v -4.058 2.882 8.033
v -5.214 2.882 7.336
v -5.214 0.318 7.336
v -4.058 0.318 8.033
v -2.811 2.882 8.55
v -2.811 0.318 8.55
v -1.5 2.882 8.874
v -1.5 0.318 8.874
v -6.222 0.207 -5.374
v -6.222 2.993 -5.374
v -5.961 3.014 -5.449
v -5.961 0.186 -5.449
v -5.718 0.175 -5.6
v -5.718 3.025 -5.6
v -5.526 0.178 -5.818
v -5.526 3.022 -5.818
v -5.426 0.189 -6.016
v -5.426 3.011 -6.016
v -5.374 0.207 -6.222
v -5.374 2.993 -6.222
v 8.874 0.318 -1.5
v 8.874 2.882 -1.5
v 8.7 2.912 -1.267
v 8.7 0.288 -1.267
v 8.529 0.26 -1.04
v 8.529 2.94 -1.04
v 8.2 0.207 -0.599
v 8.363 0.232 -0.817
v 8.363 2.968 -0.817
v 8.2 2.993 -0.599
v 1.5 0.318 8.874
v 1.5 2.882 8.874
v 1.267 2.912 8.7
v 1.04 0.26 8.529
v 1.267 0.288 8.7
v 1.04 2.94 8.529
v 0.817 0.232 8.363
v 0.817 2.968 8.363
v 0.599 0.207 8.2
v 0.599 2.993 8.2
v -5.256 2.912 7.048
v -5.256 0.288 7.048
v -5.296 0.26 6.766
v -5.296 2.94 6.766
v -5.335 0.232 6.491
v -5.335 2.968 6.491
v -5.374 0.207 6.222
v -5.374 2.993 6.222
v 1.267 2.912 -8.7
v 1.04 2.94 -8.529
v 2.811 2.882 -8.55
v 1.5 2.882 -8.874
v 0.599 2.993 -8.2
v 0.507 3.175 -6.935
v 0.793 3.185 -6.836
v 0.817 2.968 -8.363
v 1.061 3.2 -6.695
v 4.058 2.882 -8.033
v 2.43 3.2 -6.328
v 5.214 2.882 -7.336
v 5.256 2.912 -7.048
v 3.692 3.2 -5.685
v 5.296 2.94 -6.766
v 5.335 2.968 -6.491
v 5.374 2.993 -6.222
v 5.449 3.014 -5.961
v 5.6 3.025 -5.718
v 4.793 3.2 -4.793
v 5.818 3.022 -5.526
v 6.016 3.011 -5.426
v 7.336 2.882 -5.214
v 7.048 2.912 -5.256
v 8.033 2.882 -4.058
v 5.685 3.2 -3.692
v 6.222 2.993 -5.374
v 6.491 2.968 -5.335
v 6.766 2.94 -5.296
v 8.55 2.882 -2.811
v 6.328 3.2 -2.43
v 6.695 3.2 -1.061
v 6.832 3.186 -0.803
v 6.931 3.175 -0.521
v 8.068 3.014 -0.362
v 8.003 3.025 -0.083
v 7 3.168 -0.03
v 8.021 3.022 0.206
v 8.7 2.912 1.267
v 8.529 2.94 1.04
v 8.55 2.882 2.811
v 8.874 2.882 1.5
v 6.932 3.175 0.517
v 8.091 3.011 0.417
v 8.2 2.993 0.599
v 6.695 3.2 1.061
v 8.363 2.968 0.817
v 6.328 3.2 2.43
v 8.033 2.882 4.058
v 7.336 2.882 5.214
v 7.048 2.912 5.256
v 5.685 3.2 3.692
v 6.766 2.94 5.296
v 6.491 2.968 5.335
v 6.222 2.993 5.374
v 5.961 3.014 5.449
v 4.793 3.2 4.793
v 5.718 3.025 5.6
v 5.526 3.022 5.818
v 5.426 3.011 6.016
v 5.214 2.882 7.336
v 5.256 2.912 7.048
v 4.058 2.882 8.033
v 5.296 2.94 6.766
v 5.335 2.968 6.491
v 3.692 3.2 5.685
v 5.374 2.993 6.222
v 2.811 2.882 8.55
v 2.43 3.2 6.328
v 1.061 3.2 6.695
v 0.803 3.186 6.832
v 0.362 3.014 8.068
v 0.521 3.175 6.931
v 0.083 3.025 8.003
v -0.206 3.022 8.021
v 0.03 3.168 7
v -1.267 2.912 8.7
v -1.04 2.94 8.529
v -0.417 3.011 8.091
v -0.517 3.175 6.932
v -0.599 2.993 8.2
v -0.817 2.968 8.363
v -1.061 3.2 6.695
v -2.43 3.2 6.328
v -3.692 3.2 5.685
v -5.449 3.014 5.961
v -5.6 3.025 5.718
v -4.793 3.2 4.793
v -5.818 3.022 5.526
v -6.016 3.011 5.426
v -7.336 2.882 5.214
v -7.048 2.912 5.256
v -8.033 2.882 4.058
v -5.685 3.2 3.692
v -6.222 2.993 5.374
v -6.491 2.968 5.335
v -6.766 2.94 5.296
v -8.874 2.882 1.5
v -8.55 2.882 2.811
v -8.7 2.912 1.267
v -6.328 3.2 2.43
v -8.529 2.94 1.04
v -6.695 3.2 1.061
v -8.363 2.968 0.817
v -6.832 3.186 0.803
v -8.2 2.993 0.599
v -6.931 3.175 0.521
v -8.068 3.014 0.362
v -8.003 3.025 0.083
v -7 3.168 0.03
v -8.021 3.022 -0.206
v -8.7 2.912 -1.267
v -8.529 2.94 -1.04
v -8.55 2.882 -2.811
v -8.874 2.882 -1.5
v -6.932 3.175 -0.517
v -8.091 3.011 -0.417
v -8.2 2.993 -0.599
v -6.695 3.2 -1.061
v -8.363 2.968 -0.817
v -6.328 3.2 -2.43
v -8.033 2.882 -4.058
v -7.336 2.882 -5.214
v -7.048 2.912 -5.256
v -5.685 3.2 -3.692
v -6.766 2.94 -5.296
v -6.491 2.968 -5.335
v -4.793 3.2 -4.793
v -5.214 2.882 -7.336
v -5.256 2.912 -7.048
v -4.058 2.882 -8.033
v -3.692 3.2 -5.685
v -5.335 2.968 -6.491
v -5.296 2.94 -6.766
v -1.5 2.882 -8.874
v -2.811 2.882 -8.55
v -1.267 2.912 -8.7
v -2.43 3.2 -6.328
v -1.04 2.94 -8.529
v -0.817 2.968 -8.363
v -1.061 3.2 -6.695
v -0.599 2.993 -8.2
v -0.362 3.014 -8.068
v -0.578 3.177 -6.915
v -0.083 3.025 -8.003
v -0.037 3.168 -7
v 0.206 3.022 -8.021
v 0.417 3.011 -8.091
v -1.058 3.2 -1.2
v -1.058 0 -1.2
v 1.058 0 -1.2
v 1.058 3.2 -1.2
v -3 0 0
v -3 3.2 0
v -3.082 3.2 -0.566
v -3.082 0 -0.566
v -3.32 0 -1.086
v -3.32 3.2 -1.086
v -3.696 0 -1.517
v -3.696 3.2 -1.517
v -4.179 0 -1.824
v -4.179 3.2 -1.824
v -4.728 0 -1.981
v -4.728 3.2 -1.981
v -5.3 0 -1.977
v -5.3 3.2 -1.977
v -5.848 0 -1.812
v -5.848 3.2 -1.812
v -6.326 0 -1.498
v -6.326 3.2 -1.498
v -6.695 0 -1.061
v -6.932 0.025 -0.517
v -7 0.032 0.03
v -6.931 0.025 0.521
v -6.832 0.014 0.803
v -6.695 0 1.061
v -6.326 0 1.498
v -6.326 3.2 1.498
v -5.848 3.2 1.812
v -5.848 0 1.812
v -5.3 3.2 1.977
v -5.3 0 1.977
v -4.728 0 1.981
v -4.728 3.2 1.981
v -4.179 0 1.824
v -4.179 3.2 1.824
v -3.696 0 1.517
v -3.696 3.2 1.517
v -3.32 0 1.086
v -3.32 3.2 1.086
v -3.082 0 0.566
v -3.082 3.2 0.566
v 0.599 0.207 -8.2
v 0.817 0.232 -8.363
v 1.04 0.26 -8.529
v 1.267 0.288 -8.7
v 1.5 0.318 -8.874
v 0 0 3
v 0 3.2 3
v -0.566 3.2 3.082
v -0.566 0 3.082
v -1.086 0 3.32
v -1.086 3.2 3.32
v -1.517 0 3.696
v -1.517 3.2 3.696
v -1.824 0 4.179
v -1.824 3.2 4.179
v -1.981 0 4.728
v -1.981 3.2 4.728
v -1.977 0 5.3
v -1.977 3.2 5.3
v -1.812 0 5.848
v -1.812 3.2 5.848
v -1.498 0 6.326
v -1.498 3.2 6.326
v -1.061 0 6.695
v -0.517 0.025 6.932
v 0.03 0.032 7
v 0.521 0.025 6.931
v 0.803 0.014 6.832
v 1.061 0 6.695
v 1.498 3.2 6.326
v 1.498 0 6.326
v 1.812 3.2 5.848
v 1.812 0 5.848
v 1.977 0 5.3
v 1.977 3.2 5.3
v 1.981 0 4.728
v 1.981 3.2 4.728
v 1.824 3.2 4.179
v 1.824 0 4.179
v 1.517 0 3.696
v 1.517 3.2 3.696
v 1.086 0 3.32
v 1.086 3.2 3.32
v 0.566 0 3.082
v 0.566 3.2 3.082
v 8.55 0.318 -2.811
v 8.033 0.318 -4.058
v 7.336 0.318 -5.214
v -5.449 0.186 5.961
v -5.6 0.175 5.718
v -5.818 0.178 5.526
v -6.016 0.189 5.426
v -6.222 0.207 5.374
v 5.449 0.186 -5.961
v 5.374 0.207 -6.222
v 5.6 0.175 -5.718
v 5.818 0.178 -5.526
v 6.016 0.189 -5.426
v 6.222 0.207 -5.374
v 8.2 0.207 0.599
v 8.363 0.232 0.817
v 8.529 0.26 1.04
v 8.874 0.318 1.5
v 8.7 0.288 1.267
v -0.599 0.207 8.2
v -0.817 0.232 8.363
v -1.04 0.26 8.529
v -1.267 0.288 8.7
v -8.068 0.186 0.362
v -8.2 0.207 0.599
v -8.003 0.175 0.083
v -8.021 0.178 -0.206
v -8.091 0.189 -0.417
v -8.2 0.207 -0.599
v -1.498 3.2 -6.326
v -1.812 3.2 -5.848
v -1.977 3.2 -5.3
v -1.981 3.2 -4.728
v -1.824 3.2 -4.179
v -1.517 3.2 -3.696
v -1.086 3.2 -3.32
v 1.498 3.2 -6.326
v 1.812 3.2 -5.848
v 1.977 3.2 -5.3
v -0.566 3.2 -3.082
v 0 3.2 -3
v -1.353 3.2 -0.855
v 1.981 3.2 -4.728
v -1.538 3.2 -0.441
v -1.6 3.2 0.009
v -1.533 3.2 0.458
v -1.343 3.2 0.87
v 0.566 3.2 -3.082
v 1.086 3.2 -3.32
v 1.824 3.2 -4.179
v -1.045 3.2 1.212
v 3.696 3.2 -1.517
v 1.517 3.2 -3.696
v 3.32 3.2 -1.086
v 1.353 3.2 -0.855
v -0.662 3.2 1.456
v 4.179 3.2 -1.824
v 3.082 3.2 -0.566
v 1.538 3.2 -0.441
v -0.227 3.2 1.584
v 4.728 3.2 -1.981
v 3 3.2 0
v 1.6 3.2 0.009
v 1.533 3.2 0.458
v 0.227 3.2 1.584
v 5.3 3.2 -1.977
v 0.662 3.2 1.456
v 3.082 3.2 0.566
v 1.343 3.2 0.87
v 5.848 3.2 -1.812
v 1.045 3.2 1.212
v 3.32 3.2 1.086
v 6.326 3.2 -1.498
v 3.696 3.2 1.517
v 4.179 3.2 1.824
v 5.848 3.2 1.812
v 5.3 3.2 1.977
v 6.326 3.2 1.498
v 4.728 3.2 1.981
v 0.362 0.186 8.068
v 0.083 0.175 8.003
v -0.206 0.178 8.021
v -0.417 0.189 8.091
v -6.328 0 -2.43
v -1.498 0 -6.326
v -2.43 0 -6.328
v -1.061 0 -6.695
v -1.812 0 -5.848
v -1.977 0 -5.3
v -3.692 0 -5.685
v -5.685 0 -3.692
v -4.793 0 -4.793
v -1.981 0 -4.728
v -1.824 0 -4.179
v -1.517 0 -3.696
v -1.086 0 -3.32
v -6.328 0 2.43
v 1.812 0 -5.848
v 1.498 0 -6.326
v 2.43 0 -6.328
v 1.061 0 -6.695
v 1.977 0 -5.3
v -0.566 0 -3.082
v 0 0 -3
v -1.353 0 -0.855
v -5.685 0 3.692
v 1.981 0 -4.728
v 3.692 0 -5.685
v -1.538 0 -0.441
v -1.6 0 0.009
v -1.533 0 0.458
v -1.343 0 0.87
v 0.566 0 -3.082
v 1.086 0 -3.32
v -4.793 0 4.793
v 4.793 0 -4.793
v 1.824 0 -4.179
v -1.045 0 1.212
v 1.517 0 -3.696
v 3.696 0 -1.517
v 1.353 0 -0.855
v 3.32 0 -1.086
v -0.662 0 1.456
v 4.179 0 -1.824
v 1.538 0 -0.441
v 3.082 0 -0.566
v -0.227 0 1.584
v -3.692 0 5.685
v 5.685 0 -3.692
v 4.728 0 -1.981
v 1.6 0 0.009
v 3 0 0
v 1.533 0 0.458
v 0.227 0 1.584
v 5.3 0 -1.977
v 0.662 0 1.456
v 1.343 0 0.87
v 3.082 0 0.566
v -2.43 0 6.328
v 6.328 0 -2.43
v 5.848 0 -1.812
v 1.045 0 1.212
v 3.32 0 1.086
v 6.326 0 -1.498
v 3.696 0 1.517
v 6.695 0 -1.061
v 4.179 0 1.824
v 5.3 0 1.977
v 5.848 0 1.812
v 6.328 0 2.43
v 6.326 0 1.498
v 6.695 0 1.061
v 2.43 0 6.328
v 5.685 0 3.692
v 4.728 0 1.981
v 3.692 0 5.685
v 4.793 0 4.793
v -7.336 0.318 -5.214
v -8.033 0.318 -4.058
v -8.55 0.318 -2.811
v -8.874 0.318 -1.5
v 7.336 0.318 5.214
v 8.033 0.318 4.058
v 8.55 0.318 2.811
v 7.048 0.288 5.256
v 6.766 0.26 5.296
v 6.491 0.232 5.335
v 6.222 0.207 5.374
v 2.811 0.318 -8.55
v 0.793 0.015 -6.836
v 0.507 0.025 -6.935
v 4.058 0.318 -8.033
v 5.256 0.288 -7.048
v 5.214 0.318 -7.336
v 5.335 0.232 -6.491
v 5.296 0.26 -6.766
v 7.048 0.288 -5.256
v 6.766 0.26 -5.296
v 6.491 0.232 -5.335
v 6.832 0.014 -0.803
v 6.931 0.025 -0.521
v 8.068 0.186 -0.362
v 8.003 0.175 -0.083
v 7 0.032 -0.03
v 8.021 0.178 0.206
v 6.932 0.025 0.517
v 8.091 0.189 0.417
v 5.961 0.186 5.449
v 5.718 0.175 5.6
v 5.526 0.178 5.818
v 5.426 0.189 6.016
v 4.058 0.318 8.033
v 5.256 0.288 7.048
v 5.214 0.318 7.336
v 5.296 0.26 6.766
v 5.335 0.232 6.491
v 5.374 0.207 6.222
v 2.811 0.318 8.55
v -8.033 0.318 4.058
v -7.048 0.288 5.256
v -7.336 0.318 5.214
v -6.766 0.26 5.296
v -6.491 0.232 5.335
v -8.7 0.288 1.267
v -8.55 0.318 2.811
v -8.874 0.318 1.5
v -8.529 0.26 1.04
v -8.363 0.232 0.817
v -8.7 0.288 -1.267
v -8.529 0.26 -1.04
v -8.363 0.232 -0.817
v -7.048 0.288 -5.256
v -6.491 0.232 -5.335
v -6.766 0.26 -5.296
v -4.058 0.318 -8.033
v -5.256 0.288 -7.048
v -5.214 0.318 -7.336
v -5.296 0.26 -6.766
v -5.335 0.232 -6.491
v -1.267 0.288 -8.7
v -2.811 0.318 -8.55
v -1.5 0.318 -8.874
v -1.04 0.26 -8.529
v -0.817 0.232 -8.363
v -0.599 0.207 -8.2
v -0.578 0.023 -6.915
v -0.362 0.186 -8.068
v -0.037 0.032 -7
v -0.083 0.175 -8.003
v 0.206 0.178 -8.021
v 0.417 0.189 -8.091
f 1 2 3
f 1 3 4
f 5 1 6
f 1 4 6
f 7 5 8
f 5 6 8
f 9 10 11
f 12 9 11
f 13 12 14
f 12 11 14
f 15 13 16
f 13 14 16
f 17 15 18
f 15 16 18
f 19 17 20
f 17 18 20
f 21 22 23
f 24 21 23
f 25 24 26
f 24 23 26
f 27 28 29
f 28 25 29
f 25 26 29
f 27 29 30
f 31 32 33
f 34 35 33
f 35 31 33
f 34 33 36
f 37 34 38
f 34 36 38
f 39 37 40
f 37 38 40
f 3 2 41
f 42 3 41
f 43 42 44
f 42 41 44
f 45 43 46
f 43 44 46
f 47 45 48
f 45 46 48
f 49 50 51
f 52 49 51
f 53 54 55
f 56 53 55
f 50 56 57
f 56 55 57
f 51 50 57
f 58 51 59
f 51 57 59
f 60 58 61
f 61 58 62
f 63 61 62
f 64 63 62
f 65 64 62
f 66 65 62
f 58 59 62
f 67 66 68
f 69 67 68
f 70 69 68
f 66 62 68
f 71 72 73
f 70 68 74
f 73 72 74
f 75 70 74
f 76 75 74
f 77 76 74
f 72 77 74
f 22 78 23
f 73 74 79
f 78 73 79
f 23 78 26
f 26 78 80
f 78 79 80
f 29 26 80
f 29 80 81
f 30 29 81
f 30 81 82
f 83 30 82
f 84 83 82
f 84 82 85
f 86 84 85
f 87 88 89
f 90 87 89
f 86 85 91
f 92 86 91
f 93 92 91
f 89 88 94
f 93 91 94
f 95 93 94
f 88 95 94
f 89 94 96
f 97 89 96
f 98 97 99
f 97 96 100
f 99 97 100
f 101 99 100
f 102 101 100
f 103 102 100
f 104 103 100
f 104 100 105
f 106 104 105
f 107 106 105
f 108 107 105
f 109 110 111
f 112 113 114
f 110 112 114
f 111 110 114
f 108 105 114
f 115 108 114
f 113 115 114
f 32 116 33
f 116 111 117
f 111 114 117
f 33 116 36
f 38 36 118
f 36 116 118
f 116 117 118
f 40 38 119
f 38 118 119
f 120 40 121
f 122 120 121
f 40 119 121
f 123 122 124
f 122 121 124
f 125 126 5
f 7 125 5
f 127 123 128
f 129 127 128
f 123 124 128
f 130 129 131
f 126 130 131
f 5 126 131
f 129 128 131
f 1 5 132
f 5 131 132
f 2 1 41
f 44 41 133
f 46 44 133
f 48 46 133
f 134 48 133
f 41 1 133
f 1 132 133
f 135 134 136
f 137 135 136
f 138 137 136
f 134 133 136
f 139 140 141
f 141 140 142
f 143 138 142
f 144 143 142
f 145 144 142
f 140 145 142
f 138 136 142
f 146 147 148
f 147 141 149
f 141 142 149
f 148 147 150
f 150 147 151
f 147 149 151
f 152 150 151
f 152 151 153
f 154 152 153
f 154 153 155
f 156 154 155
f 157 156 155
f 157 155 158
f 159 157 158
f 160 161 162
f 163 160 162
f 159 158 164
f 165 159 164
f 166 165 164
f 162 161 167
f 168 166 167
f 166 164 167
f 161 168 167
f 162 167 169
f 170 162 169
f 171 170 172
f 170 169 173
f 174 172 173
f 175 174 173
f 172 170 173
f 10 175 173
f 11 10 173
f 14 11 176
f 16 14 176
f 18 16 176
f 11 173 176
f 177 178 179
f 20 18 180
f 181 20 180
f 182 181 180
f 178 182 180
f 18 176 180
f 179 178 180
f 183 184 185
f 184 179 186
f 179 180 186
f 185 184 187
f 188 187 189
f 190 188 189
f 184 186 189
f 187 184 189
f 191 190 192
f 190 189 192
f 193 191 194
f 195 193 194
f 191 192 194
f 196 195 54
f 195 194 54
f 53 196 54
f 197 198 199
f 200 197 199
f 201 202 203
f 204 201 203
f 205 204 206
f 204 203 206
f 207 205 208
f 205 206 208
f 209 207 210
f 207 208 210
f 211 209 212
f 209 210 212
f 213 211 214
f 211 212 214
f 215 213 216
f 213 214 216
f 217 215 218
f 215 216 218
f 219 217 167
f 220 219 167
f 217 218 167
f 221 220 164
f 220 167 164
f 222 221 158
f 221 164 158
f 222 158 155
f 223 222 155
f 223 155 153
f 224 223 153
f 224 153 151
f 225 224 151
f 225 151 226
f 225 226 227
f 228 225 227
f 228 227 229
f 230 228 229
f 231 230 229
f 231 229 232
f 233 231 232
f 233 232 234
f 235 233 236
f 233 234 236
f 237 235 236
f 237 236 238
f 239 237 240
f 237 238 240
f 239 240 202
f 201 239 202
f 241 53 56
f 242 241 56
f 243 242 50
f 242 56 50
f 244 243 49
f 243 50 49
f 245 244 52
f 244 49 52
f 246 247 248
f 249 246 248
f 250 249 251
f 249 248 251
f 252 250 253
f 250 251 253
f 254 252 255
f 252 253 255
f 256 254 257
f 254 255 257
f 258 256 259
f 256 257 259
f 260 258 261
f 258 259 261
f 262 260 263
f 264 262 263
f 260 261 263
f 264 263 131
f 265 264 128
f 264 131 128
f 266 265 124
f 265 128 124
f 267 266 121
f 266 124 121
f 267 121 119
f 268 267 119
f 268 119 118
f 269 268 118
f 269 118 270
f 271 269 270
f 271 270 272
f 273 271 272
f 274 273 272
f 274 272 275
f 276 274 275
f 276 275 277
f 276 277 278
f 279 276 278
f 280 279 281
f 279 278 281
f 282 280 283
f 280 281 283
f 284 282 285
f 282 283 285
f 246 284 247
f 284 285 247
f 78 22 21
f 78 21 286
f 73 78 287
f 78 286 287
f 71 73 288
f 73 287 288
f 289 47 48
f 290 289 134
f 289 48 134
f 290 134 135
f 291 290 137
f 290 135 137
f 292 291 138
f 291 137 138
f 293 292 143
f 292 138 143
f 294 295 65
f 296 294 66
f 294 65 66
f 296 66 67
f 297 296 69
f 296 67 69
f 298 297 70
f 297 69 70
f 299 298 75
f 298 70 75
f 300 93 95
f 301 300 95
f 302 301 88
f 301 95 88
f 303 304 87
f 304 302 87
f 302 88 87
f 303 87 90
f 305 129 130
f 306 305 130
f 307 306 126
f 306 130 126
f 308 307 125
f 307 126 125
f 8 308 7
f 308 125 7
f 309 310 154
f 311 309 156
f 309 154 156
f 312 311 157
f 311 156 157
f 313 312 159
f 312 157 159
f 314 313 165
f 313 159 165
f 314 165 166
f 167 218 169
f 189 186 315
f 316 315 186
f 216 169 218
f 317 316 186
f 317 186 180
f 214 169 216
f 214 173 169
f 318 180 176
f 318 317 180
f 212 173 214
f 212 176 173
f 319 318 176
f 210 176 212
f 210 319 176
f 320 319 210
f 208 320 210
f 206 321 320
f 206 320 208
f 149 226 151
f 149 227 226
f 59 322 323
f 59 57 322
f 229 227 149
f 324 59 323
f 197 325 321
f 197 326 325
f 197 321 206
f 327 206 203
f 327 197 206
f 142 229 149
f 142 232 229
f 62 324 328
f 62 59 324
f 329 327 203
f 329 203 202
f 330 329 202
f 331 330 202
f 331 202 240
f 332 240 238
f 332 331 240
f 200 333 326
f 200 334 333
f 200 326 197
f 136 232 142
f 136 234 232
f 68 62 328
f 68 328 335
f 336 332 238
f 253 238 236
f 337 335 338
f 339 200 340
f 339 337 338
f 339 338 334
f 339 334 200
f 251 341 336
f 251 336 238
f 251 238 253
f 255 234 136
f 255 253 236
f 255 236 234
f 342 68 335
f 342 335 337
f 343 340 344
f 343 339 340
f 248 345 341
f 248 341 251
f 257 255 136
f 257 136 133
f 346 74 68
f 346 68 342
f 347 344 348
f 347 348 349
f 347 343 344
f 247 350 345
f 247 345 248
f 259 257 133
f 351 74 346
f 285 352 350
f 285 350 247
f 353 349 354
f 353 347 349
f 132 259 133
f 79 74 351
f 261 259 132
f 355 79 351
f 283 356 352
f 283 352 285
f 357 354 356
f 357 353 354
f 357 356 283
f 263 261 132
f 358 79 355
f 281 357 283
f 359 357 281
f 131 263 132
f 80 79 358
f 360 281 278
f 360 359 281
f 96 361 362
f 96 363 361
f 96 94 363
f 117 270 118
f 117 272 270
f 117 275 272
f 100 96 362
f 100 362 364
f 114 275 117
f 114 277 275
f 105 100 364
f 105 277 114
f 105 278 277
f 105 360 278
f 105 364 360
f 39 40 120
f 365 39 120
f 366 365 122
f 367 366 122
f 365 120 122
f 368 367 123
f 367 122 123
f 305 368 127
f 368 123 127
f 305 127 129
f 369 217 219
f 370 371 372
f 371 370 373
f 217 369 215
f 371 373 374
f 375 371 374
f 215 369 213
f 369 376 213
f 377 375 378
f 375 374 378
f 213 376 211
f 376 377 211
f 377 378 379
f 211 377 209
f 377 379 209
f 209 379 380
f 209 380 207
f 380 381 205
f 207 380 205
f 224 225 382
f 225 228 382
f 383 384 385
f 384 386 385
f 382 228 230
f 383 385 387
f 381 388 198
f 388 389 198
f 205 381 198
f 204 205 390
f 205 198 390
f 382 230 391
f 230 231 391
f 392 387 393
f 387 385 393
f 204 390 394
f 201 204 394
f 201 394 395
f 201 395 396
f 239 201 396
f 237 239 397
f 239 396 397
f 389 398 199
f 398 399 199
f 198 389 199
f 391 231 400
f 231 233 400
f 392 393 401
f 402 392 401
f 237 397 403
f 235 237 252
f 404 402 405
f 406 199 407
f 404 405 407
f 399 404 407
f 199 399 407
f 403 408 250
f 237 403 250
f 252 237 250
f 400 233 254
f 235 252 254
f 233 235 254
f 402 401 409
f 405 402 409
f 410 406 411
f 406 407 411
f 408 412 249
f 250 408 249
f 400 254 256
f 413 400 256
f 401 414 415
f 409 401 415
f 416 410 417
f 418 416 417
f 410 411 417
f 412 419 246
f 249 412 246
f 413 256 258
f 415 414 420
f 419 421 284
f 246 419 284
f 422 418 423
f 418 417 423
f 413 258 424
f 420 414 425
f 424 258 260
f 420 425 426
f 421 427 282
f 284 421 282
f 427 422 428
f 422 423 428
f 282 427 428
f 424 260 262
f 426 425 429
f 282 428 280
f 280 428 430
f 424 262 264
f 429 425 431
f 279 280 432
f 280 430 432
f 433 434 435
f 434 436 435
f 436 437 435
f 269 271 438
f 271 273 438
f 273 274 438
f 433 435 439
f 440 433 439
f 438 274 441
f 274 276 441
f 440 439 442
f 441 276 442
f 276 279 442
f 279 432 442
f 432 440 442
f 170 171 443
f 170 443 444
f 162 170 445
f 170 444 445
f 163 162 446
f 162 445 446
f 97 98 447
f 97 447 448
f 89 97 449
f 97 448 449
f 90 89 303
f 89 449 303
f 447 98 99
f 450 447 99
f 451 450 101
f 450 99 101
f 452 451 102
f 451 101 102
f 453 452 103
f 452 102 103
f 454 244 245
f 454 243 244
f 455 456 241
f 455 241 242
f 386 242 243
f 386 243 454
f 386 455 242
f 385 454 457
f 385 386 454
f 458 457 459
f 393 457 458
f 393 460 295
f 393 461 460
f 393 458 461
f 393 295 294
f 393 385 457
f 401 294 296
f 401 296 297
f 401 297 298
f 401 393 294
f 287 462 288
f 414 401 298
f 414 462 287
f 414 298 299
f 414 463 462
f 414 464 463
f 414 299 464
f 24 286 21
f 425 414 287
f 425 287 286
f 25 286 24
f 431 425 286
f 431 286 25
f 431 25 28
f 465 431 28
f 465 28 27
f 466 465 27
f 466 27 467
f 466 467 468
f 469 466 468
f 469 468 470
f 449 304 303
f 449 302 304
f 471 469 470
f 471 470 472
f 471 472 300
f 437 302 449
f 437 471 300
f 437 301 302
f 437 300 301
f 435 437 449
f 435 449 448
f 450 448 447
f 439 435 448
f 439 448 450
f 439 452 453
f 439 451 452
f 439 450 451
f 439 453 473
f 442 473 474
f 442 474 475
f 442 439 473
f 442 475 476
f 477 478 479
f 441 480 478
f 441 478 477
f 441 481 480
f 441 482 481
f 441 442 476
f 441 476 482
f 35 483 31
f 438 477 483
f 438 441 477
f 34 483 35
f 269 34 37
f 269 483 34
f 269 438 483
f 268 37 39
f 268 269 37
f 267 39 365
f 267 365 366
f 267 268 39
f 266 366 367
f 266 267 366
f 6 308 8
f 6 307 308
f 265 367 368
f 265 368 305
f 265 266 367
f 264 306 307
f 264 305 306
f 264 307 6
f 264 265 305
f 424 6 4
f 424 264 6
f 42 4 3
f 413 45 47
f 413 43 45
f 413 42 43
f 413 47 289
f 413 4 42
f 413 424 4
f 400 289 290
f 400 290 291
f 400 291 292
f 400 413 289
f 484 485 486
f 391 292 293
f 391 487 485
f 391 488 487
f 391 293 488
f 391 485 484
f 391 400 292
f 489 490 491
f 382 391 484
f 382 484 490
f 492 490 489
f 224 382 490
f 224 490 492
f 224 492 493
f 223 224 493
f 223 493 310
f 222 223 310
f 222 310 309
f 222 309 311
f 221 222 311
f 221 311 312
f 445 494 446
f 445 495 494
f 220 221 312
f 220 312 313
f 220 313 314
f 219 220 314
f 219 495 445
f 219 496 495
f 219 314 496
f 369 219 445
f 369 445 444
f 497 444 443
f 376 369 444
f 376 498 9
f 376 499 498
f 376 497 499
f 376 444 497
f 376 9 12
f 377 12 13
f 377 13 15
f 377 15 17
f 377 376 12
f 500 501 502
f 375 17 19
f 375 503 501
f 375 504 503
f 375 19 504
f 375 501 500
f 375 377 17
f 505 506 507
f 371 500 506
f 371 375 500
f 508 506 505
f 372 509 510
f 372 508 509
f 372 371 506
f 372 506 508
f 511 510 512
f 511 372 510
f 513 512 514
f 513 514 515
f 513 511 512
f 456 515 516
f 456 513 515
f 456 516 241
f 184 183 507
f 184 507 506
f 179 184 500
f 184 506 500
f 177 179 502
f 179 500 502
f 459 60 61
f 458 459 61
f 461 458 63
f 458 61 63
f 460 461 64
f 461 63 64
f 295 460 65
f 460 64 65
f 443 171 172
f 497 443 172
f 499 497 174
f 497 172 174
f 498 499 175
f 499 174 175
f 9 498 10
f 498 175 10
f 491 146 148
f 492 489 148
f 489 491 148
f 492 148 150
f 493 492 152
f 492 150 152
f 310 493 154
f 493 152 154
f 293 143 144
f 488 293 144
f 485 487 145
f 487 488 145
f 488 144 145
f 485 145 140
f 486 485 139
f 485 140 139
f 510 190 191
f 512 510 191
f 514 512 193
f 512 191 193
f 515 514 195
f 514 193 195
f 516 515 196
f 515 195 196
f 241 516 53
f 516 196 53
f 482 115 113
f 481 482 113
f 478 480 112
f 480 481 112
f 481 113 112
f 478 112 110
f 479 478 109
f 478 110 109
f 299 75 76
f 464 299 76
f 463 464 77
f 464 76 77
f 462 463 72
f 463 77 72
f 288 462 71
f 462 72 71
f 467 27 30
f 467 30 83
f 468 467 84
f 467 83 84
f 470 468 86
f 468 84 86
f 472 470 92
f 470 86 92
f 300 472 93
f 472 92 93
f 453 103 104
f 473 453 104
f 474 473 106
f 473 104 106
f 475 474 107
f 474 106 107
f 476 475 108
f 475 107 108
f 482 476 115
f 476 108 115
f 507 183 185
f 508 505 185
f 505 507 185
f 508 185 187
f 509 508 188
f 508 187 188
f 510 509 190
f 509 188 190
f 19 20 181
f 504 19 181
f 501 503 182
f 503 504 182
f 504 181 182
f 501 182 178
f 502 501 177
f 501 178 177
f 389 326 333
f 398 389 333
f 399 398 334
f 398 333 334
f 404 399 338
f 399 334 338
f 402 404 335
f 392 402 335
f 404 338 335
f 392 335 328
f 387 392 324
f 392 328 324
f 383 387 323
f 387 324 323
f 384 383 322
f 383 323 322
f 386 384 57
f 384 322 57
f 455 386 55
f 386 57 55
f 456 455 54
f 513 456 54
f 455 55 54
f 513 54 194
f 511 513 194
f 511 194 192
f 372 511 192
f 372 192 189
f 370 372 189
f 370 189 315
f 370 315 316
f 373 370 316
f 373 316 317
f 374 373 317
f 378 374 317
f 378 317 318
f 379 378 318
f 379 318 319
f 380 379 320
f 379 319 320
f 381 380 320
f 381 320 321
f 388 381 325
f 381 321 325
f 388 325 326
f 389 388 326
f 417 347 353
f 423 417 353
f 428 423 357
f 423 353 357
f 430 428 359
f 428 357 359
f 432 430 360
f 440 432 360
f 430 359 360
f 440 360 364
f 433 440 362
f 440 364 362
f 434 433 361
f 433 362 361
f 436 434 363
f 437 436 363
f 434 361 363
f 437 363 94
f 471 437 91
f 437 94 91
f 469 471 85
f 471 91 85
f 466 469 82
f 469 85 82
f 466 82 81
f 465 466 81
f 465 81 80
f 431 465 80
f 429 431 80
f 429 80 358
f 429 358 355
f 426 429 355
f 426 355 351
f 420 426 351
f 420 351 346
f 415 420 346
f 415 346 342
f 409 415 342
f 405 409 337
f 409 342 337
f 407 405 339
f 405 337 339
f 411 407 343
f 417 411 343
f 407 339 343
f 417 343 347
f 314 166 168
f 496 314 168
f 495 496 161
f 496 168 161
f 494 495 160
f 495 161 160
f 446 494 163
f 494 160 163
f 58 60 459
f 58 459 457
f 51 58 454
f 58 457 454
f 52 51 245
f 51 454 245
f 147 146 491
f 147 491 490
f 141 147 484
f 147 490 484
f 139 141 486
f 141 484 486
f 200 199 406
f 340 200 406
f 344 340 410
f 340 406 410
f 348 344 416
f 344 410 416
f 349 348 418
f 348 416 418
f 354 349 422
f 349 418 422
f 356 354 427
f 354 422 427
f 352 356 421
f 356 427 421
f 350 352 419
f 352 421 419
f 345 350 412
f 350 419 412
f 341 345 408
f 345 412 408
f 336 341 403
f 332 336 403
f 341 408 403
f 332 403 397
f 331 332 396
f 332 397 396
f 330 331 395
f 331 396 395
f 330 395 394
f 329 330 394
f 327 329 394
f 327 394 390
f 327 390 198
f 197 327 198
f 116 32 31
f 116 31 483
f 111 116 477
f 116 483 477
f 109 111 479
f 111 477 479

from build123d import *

# Parameters (mm, degrees)
SKETCH_1_R               = 9
EXTRUDE_1_DEPTH          = 3.2
CUT_EXTRUDE_2_REACH      = 15.124
PATTERN_CIRCULAR_1_COUNT = 8
CUT_EXTRUDE_1_REACH      = 14.951
SKETCH_3_R               = 2
PATTERN_CIRCULAR_2_COUNT = 4


with BuildPart() as part:
    # 草图1 → 凸台-拉伸1 (new body)
    with BuildSketch(Plane(origin=(0, 0, 0), x_dir=(1, 0, 0), z_dir=(0, 1, 0))):
        with Locations(Location((0, 0, 0), (0, 0, 270))):
            Circle(SKETCH_1_R)
        with BuildLine():
            Line((-1.058300524, 1.2), (1.058300524, 1.2))
            ThreePointArc((1.058300524, 1.2), (0, -1.6), (-1.058300524, 1.2))
        make_face(mode=Mode.SUBTRACT)
    extrude(amount=EXTRUDE_1_DEPTH)

    # 草图4 → 切除-拉伸2 (cut, up to next)
    with BuildSketch(Plane(origin=(0, 3.2, 0), x_dir=(1, 0, 0), z_dir=(0, 1, 0)), mode=Mode.PRIVATE) as cut_extrude_2_sk1:
        with BuildLine():
            Line((-1.5, 8.874119675), (-0.599498979, 8.19962448))
            ThreePointArc((-0.599498979, 8.19962448), (0, 8), (0.599498979, 8.19962448))
            Line((0.599498979, 8.19962448), (1.5, 8.874119675))
            ThreePointArc((1.5, 8.874119675), (0, 9), (-1.5, 8.874119675))
        make_face()
    cut_extrude_2_tool1 = extrude(cut_extrude_2_sk1.sketch, amount=-CUT_EXTRUDE_2_REACH, mode=Mode.PRIVATE) & part.part
    cut_extrude_2 = cut_extrude_2_tool1.solids().sort_by_distance((0, 3.2, -8.590322))[0]
    add(cut_extrude_2, mode=Mode.SUBTRACT)

    # 阵列(圆周)1: 切除-拉伸2 ×8 about axis
    pattern_circular_1_axis = Axis((0, 0, 0), (0, 1, 0))
    for i in range(1, PATTERN_CIRCULAR_1_COUNT):
        add(cut_extrude_2.rotate(pattern_circular_1_axis, i * 360 / PATTERN_CIRCULAR_1_COUNT), mode=Mode.SUBTRACT)

    # 草图3 → 切除-拉伸1 (cut, up to next)
    with BuildSketch(Plane(origin=(0, 3.2, 0), x_dir=(1, 0, 0), z_dir=(0, 1, 0)), mode=Mode.PRIVATE) as cut_extrude_1_sk1:
        with Locations(Location((0, 5, 0), (0, 0, 270))):
            Circle(SKETCH_3_R)
    cut_extrude_1_tool1 = extrude(cut_extrude_1_sk1.sketch, amount=-CUT_EXTRUDE_1_REACH, mode=Mode.PRIVATE) & part.part
    cut_extrude_1 = cut_extrude_1_tool1.solids().sort_by_distance((0, 3.2, -5))[0]
    add(cut_extrude_1, mode=Mode.SUBTRACT)

    # 阵列(圆周)2: 切除-拉伸1 ×4 about axis
    pattern_circular_2_axis = Axis((0, 0, 0), (0, 1, 0))
    for i in range(1, PATTERN_CIRCULAR_2_COUNT):
        add(cut_extrude_1.rotate(pattern_circular_2_axis, i * 360 / PATTERN_CIRCULAR_2_COUNT), mode=Mode.SUBTRACT)

    # 草图5 → 切除-旋转1 (revolve, cut)
    with BuildSketch(Plane(origin=(0, 0, 0), x_dir=(0, 0, -1), z_dir=(1, 0, 0)), mode=Mode.PRIVATE) as cut_revolve_1_sk:
        Polygon((9.374119675, 2.82841307), (6.778765119, 3.2), (9.374119675, 3.2), align=None)
    cut_revolve_1 = revolve(cut_revolve_1_sk.sketch.rotate(Axis((0, 3.2, 0), (0, -1, 0)), 4.181624795), axis=Axis((0, 3.2, 0), (0, -1, 0)), mode=Mode.SUBTRACT)

    # 镜向1: 切除-旋转1 across plane
    add(cut_revolve_1.mirror(Plane.ZX.offset(1.6)), mode=Mode.SUBTRACT)


solid = part.part
